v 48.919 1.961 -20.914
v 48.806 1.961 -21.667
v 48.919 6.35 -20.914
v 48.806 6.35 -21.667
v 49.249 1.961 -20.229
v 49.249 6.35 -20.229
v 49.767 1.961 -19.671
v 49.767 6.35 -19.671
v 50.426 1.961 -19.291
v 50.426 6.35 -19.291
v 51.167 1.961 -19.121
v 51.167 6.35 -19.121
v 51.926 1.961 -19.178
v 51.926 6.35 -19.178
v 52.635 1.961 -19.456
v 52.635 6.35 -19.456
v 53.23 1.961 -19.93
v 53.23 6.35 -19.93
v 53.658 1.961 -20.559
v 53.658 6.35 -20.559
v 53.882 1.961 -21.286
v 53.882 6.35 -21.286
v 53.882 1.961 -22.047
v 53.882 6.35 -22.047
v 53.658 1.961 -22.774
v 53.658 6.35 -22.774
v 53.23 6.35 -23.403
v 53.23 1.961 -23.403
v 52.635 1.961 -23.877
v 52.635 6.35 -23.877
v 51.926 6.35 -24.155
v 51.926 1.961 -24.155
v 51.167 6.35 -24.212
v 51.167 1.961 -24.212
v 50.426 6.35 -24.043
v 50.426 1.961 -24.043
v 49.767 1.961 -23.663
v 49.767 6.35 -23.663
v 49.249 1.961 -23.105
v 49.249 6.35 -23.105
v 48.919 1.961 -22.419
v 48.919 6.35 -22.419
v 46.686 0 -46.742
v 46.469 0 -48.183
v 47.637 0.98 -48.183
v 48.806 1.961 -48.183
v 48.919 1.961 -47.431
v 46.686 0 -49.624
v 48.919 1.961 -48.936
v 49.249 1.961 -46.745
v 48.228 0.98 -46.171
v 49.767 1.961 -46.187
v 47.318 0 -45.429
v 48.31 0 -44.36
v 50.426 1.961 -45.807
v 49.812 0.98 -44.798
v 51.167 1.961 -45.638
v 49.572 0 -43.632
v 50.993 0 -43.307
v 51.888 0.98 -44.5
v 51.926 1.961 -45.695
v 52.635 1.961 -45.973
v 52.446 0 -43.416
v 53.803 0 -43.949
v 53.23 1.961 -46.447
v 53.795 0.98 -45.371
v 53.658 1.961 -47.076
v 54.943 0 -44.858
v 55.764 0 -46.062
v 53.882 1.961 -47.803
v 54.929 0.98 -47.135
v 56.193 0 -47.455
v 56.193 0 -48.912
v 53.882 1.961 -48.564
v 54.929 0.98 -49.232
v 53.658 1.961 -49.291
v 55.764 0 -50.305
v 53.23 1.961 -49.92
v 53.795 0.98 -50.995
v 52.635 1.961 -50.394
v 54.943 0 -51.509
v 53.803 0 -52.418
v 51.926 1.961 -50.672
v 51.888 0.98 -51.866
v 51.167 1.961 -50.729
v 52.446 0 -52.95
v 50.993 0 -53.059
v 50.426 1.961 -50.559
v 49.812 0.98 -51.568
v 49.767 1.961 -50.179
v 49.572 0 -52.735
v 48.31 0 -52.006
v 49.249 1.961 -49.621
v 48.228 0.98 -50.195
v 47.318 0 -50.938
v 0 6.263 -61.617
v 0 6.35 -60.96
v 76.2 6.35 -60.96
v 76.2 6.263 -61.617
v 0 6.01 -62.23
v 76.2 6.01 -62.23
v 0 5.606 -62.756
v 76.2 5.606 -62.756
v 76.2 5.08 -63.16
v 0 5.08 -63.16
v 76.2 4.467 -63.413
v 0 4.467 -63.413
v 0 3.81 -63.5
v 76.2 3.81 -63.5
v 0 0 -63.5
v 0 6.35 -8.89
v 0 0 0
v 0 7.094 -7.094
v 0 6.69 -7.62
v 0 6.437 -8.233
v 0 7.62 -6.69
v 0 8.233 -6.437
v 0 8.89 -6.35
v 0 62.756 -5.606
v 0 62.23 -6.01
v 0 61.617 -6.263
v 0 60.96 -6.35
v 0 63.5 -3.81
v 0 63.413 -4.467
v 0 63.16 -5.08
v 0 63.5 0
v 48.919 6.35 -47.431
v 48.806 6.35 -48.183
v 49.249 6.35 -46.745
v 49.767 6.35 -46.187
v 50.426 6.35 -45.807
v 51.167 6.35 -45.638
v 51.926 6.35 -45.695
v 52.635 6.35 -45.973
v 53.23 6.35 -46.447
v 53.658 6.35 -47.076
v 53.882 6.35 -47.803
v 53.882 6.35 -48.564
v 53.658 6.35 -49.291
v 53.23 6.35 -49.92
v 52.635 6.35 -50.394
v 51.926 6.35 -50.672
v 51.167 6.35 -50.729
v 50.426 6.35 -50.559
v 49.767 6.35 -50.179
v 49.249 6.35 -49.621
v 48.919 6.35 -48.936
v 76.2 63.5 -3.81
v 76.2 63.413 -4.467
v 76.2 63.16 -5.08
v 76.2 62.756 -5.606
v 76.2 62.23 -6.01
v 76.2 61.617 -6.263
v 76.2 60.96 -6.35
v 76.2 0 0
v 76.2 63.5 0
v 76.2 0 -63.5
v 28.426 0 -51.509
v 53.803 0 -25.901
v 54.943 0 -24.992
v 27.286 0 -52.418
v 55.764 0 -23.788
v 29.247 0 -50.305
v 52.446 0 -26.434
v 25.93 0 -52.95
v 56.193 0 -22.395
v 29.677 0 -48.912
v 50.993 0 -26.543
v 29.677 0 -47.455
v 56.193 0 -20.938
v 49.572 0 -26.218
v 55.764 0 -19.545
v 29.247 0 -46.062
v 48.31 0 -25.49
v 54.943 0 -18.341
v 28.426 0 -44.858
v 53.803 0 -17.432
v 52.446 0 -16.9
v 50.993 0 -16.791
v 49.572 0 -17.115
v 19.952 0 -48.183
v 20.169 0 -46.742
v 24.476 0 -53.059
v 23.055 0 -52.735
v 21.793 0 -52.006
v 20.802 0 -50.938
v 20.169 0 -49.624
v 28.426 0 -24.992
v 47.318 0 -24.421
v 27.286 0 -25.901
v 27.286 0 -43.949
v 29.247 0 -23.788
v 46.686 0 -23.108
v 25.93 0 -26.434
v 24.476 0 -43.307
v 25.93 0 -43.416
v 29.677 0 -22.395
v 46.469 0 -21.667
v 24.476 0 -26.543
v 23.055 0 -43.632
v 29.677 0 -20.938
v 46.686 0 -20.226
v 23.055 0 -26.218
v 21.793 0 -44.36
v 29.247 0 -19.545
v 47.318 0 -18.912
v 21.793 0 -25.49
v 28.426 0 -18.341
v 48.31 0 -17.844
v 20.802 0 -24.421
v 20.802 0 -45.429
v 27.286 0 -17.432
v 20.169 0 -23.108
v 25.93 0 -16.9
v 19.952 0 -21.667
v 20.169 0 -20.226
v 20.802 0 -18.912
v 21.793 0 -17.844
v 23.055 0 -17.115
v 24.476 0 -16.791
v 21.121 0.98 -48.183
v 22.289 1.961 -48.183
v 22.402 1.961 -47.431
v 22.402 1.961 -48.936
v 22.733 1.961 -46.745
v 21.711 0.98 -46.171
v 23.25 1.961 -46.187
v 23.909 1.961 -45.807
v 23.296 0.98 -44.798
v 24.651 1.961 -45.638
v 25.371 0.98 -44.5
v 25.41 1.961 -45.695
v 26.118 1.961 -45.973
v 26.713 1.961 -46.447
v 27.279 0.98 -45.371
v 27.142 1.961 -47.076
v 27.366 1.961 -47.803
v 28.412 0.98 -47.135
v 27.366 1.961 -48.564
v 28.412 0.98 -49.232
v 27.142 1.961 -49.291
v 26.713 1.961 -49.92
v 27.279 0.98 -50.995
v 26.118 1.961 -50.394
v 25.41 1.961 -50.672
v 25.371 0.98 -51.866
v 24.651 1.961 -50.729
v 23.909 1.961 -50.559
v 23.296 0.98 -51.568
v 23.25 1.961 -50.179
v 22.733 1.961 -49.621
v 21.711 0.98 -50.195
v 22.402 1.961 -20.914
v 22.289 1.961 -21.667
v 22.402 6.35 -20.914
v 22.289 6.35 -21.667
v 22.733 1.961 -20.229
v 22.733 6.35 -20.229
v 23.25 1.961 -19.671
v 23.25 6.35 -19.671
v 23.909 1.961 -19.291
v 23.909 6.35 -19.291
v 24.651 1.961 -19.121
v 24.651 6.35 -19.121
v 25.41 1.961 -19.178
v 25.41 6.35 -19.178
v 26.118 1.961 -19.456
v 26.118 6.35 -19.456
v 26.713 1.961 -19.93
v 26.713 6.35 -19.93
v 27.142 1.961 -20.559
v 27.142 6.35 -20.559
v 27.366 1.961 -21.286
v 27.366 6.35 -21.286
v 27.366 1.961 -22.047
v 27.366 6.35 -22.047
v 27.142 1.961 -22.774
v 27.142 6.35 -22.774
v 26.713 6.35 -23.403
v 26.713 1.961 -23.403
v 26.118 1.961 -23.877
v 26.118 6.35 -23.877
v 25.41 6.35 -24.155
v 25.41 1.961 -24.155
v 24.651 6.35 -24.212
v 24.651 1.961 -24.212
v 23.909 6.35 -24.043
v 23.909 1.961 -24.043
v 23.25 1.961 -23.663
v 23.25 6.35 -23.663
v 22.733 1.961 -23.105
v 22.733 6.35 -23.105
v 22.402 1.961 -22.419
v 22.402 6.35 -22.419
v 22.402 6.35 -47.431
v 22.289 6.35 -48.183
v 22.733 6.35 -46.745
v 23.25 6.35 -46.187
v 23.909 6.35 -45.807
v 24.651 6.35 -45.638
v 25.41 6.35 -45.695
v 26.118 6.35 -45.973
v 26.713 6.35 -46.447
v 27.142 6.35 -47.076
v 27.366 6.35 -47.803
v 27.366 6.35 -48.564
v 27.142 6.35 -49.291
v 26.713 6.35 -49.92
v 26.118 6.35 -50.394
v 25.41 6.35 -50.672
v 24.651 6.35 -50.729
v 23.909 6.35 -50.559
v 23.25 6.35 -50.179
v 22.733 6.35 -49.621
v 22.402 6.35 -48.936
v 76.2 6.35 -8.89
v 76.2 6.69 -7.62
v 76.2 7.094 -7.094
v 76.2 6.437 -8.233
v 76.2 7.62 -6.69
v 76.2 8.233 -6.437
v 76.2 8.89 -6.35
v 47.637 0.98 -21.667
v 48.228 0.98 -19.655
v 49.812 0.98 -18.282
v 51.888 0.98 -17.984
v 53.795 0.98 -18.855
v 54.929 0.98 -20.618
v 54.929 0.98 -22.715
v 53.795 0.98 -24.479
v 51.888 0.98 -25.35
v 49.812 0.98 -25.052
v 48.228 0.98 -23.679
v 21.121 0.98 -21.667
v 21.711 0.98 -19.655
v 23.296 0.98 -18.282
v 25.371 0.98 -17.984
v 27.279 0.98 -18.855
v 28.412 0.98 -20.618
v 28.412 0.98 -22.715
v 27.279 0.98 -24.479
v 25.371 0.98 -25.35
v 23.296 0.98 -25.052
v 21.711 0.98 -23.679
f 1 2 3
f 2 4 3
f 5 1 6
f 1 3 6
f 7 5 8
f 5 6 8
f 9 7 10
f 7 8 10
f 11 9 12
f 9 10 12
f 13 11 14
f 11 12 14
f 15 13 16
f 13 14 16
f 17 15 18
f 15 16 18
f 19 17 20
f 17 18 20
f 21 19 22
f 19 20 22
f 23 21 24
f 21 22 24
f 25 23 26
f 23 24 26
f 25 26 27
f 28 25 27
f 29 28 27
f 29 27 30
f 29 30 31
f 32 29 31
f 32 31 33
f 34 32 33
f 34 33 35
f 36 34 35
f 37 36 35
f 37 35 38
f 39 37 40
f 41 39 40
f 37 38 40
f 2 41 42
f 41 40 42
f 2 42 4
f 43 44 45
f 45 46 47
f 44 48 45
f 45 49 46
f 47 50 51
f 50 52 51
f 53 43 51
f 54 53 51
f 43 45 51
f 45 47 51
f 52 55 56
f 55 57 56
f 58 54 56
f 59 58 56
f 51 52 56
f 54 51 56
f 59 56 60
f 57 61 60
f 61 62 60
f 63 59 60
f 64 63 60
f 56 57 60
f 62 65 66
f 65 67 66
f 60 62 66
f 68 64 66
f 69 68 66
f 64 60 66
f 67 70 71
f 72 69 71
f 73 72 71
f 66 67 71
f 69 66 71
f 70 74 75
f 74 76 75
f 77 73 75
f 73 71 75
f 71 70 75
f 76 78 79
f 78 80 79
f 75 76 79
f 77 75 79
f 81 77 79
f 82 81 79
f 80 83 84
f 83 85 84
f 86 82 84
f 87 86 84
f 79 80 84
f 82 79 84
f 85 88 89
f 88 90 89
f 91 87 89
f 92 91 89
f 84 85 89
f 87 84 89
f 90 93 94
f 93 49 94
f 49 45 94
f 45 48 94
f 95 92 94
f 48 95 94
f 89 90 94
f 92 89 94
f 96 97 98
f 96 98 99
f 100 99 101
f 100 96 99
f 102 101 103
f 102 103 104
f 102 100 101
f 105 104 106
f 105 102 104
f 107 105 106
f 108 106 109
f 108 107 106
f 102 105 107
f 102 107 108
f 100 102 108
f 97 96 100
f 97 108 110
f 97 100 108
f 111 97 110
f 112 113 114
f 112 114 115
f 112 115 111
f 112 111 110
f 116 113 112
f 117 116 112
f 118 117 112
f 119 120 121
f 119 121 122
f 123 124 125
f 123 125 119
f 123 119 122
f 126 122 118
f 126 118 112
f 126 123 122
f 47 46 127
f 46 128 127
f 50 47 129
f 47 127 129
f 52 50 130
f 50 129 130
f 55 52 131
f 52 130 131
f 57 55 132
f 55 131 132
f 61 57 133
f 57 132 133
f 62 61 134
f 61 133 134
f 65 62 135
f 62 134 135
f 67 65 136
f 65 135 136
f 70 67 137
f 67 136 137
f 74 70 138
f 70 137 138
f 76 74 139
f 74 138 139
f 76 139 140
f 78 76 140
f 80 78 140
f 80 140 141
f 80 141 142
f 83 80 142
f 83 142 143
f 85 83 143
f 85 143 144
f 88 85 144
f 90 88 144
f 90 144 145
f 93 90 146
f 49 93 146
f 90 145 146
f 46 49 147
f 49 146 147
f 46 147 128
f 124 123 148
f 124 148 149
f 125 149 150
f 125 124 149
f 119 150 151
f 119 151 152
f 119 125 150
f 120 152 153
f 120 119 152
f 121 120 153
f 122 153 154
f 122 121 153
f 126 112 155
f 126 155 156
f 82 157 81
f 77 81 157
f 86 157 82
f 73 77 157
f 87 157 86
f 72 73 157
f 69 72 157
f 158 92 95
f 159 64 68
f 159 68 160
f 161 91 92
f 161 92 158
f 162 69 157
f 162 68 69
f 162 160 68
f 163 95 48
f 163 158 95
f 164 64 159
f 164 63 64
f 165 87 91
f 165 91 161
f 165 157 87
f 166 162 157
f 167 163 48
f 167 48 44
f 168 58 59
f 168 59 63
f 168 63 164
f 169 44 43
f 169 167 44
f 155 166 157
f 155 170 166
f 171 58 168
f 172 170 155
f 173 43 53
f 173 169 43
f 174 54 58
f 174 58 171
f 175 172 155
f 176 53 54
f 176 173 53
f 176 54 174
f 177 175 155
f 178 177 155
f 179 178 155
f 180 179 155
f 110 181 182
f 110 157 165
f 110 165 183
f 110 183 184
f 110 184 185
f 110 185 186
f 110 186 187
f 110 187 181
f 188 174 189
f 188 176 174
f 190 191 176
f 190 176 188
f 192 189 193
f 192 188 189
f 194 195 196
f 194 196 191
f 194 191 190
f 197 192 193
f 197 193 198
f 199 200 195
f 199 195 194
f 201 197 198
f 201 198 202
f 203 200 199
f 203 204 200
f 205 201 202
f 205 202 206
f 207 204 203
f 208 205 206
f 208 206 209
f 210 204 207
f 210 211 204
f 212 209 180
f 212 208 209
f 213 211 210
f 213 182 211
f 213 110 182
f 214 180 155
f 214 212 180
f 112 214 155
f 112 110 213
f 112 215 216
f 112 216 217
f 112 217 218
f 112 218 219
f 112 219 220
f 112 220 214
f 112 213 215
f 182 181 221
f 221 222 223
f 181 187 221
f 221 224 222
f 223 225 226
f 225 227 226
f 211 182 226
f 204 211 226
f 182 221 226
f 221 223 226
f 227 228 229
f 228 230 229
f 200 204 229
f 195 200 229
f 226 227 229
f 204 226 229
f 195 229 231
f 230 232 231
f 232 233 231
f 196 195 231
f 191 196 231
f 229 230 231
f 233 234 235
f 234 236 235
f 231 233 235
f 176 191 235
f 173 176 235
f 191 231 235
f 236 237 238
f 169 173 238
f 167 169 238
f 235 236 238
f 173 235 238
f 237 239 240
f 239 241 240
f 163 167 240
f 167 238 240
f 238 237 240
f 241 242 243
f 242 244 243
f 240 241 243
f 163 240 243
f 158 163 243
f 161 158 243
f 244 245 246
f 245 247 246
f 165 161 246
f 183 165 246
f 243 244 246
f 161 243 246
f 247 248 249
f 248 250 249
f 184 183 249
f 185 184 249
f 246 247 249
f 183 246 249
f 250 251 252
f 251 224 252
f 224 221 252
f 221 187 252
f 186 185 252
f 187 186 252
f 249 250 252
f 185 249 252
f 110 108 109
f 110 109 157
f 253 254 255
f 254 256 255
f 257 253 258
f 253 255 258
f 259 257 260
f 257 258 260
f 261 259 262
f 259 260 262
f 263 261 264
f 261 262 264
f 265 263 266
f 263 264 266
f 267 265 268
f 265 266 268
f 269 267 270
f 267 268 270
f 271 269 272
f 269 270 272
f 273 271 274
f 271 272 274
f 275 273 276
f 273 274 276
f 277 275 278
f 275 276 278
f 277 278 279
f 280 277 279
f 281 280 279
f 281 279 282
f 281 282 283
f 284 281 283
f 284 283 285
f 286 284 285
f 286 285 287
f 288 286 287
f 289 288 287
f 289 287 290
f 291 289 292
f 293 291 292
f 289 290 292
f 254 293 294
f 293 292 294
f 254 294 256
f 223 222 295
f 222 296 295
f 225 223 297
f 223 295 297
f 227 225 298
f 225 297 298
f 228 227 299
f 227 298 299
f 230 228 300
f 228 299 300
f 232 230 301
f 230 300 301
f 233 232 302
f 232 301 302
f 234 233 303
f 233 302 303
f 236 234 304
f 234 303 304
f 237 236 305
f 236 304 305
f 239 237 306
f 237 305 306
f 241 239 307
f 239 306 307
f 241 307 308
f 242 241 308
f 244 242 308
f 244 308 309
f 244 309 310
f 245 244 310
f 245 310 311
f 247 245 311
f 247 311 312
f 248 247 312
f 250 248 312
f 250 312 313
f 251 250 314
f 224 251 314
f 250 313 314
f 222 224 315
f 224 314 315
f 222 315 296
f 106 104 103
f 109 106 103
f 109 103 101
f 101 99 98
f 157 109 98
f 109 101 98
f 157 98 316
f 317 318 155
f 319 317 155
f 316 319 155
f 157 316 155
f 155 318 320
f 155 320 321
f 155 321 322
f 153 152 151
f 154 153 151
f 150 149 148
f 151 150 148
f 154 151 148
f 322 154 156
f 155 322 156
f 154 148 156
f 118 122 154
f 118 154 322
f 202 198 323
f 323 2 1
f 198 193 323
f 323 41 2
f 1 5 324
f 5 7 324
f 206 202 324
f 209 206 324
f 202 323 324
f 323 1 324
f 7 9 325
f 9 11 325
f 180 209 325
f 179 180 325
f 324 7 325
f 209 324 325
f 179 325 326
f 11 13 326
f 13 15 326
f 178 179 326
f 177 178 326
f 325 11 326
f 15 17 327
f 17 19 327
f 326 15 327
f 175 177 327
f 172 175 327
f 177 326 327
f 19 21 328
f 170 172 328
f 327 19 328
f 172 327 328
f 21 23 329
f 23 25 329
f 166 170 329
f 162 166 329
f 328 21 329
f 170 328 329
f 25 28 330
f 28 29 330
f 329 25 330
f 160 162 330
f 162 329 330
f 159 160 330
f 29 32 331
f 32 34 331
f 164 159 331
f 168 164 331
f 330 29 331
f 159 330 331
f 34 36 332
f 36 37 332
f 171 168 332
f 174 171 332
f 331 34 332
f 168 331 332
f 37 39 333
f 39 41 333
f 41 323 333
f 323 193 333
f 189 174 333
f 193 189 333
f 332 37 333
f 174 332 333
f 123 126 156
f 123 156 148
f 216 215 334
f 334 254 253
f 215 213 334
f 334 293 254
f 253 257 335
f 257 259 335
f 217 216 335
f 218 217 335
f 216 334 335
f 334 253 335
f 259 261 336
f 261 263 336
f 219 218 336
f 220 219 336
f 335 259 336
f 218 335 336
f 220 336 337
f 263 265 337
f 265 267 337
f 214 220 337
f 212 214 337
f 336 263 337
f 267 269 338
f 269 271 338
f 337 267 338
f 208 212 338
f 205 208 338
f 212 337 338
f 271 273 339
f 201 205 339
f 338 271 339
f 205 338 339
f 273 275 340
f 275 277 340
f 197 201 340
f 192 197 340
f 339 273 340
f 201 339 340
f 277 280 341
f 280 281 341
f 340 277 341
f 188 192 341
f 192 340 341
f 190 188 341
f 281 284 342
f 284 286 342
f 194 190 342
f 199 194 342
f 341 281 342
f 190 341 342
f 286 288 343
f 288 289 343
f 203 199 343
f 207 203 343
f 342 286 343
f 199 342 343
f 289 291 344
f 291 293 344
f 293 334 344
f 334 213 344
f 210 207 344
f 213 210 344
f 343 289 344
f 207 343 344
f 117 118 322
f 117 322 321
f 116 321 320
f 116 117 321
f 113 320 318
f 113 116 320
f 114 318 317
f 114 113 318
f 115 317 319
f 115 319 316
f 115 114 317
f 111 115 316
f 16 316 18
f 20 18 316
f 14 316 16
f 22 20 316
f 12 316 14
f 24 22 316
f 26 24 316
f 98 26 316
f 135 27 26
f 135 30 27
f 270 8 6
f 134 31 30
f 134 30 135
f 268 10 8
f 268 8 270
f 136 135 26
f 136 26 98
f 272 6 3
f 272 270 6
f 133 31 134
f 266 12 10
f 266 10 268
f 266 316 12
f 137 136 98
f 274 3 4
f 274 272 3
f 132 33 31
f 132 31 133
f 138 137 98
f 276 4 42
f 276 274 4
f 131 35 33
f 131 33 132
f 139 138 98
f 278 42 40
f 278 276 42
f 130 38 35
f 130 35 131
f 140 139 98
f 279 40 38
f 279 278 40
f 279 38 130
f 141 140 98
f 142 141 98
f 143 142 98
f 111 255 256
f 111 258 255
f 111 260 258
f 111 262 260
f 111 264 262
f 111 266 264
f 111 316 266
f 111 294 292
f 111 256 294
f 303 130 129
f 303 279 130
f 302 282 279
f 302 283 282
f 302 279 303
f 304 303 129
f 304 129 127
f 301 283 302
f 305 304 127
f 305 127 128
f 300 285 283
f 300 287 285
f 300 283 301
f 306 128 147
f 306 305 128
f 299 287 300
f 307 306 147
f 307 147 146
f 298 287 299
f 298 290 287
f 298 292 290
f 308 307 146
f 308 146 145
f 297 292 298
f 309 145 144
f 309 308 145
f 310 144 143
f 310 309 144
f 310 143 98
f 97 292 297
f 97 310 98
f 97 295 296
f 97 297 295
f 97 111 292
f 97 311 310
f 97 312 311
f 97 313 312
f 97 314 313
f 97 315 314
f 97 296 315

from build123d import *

# Parameters (mm, degrees)
BOSS_EXTRUDE2_DEPTH                                = 76.2
CSK_FOR_10_FLAT_HEAD_MACHINE_SCREW_100_D           = 5.1054
CSK_FOR_10_FLAT_HEAD_MACHINE_SCREW_100_CSINK_D     = 9.779
CSK_FOR_10_FLAT_HEAD_MACHINE_SCREW_100_CSINK_ANGLE = 100


with BuildPart() as part:
    # Sketch1 → Boss-Extrude2 (new body)
    with BuildSketch(Plane(origin=(0, 0, 0), x_dir=(0, 0, -1), z_dir=(1, 0, 0))):
        with BuildLine():
            Line((0, 0), (0, 63.5))
            Line((0, 63.5), (3.81, 63.5))
            ThreePointArc((3.81, 63.5), (5.606051224, 62.756051224), (6.35, 60.96))
            Line((6.35, 60.96), (6.35, 8.89))
            ThreePointArc((6.35, 8.89), (7.093948776, 7.093948776), (8.89, 6.35))
            Line((8.89, 6.35), (60.96, 6.35))
            ThreePointArc((60.96, 6.35), (62.756051224, 5.606051224), (63.5, 3.81))
            Line((63.5, 3.81), (63.5, 0))
            Line((63.5, 0), (0, 0))
        make_face()
    extrude(amount=BOSS_EXTRUDE2_DEPTH)

    # CSK for #10 Flat Head Machine Screw (100)1 (through all)
    with Locations(Plane.XZ):
        with Locations((24.841747853, -48.183252147), (51.358252147, -48.183252147), (51.358252147, -21.666747853), (24.841747853, -21.666747853)):
            CounterSinkHole(CSK_FOR_10_FLAT_HEAD_MACHINE_SCREW_100_D / 2, CSK_FOR_10_FLAT_HEAD_MACHINE_SCREW_100_CSINK_D / 2, counter_sink_angle=CSK_FOR_10_FLAT_HEAD_MACHINE_SCREW_100_CSINK_ANGLE)


solid = part.part
